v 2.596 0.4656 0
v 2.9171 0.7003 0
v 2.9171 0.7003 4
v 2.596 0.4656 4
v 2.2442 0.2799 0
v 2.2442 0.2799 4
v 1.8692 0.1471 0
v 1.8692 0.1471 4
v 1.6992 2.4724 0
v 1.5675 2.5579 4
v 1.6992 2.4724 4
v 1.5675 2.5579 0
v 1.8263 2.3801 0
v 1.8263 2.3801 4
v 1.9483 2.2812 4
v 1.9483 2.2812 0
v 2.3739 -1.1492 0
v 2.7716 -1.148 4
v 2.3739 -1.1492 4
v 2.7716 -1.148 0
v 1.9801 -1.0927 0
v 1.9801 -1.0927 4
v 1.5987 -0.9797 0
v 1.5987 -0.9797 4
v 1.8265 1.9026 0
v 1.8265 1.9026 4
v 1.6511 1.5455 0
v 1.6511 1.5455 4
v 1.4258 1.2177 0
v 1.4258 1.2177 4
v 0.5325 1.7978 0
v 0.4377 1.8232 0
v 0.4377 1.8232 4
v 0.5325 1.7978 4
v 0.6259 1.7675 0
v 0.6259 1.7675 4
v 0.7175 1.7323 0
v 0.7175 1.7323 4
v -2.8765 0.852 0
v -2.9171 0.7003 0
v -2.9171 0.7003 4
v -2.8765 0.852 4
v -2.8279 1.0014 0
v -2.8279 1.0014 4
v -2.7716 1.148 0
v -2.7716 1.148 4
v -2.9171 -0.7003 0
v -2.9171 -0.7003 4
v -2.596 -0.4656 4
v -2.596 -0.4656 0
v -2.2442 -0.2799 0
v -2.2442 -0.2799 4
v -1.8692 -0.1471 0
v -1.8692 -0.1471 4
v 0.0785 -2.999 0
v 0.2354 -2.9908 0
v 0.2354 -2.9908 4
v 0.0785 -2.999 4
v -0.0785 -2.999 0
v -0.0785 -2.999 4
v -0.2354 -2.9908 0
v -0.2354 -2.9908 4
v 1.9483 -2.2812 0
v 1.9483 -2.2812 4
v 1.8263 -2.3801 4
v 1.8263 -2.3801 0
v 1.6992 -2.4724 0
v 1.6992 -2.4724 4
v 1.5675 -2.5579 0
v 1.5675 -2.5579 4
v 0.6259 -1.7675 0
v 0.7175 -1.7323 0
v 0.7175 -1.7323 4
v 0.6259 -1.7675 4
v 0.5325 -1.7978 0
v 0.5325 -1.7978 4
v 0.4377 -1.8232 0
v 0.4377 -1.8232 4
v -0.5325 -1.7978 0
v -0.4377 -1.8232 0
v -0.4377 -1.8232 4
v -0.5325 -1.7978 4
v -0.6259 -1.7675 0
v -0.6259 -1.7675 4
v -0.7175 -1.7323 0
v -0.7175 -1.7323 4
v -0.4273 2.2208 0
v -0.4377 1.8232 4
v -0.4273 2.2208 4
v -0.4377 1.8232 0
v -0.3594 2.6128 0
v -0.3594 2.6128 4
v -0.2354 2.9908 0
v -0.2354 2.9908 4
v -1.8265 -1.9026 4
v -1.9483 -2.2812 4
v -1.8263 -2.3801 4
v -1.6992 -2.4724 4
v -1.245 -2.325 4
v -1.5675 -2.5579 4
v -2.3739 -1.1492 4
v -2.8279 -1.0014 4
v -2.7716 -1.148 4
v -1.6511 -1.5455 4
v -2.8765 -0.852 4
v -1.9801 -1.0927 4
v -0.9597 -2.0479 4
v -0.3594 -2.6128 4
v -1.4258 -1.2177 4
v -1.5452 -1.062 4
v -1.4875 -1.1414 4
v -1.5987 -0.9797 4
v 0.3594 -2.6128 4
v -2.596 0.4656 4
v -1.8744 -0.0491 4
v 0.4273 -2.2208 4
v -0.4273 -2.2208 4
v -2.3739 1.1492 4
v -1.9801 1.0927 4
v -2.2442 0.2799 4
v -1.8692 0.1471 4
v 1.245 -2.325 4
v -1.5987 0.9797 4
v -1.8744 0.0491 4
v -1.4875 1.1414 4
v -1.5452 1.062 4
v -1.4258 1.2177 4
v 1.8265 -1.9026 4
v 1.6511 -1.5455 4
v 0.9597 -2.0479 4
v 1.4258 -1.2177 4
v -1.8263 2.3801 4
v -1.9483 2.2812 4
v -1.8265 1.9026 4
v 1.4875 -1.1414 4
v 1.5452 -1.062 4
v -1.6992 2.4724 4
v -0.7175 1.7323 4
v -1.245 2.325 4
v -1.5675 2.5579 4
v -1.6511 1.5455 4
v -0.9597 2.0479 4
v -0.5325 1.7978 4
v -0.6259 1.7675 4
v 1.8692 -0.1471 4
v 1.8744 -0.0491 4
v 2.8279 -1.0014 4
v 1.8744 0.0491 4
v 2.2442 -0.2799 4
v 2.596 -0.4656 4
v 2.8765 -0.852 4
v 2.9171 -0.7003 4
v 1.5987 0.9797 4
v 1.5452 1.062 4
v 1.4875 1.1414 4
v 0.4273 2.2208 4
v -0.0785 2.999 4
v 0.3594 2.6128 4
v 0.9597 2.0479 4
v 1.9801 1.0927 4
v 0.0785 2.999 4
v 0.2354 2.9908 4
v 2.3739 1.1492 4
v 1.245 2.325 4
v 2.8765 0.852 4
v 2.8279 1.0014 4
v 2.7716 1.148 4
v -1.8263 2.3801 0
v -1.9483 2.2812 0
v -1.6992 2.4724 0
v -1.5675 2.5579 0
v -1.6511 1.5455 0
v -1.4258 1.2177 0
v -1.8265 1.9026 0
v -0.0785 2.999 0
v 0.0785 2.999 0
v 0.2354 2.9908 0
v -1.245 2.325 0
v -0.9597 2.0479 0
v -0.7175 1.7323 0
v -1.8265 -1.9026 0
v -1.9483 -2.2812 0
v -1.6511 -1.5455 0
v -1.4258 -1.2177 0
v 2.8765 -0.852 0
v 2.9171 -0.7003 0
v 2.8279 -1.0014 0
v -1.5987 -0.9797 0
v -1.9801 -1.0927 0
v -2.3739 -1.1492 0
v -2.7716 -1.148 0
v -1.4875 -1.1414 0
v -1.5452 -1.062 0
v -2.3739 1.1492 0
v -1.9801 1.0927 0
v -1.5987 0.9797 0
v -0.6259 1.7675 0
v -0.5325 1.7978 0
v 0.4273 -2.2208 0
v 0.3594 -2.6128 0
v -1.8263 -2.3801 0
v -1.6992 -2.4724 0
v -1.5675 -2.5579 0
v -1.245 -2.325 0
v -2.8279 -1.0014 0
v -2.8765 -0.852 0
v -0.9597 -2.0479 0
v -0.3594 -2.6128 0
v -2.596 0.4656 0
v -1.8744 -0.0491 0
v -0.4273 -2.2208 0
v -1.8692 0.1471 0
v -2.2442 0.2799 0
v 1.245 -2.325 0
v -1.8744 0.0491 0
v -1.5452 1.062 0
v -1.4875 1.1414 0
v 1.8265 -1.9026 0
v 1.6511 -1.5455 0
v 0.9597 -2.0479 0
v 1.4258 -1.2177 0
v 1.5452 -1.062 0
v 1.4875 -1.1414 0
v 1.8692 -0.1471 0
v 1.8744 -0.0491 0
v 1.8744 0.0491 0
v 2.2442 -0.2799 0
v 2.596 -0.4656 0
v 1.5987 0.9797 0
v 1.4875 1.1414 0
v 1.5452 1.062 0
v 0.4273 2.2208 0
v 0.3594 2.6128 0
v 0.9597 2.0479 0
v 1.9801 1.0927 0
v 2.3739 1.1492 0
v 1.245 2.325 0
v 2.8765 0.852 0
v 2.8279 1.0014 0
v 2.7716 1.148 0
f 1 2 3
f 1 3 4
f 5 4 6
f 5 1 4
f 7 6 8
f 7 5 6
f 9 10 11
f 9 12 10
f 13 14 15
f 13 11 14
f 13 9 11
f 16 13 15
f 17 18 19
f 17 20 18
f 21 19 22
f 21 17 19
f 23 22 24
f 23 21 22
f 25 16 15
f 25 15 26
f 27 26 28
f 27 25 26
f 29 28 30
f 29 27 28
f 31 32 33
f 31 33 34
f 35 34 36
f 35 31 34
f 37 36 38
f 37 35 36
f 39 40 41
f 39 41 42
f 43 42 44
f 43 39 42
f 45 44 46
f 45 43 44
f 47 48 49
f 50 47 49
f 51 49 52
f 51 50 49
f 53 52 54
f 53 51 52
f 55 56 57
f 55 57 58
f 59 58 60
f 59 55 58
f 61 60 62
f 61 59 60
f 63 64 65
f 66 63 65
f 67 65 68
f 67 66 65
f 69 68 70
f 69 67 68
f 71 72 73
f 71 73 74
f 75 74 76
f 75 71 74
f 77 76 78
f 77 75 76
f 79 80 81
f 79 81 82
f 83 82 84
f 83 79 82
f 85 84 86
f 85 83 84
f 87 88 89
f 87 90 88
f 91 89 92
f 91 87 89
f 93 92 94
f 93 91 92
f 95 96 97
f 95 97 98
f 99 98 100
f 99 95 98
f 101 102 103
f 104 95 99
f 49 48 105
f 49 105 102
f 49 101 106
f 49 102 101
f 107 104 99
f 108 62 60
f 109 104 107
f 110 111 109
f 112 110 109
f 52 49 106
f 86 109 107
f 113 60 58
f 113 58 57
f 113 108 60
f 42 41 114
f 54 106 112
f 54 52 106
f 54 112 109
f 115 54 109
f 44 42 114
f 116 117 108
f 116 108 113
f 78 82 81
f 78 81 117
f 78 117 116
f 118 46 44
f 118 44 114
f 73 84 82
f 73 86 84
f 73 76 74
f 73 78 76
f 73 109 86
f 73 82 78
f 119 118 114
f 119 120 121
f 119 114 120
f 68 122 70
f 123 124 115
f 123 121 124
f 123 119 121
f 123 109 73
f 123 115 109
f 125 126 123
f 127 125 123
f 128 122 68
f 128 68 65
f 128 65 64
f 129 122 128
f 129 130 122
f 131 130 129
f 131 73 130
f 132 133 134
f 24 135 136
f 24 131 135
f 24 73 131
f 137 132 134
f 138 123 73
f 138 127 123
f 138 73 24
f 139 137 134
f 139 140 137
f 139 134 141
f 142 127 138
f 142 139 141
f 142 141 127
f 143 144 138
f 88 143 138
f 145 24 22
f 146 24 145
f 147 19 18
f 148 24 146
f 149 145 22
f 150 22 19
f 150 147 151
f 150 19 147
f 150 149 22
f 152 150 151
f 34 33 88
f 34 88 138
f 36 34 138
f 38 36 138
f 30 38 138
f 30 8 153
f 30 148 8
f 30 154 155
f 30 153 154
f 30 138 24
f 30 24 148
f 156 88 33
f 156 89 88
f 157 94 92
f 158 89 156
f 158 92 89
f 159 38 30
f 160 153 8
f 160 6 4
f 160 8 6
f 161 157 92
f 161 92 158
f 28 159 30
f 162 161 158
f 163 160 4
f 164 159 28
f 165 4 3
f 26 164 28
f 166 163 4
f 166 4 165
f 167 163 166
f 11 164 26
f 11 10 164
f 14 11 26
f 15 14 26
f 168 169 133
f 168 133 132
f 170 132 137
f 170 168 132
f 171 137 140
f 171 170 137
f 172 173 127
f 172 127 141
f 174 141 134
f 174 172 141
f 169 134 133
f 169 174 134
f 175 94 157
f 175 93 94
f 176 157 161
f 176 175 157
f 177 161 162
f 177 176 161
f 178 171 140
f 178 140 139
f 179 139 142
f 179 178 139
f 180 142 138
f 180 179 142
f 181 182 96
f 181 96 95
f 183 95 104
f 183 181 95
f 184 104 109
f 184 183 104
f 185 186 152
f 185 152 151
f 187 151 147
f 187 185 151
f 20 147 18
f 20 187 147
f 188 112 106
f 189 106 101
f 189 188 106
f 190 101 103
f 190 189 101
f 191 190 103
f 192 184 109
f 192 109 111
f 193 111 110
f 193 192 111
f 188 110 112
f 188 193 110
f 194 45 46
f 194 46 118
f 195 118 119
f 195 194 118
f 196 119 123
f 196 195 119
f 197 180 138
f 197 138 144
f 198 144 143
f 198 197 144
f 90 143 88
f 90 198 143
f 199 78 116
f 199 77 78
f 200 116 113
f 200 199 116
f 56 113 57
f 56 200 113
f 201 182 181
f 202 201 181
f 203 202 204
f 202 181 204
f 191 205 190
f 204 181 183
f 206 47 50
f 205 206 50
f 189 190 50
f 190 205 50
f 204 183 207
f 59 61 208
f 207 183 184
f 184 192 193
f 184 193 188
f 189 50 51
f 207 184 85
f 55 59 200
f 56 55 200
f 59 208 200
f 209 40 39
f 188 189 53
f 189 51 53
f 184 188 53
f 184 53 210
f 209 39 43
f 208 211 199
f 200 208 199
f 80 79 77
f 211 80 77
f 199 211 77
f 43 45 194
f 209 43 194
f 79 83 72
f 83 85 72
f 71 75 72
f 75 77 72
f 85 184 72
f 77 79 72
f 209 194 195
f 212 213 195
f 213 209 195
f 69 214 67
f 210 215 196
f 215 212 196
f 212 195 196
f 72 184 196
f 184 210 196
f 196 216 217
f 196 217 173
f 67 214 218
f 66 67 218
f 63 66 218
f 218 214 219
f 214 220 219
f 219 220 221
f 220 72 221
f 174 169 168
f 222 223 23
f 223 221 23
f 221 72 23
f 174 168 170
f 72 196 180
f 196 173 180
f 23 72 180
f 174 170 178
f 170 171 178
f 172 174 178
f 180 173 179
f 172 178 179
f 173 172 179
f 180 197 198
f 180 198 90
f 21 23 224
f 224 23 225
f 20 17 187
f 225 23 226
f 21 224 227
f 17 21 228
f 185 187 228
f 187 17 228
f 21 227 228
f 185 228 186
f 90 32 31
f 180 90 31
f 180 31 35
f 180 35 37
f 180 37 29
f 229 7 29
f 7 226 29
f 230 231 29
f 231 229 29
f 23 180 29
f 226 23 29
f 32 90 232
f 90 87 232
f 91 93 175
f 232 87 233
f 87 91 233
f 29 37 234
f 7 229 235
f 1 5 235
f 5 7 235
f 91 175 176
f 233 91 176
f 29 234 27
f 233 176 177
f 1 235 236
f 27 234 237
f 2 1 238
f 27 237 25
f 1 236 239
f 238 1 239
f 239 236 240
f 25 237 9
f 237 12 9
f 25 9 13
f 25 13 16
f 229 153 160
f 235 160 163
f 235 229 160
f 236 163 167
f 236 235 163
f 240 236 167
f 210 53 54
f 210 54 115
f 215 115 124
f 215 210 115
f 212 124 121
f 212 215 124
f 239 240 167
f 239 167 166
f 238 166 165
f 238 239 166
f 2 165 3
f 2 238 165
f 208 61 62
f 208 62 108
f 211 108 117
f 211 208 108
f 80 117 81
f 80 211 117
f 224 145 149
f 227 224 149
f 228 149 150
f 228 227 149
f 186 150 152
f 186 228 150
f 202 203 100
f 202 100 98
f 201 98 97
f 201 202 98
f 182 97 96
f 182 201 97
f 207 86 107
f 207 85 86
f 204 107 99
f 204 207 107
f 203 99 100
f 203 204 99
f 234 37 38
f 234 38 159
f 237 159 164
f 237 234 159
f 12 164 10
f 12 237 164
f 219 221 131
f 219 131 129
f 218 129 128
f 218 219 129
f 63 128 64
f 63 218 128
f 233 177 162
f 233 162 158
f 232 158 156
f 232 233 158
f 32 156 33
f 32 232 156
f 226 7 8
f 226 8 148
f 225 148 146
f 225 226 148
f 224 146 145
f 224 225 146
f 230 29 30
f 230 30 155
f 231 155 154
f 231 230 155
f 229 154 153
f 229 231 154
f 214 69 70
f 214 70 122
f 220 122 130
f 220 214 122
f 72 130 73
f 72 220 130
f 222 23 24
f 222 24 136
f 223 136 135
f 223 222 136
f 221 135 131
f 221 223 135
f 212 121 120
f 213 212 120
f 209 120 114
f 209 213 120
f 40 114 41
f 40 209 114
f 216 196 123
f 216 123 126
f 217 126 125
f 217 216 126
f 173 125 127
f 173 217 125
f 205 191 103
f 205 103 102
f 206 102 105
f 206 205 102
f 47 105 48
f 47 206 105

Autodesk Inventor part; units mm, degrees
sketch "Sketch1" plane through (0, 0, 0) normal (0, 0, 1) x (1, 0, 0)
  circle A0 centre (0, 0) radius 3
  dimension "d0" = 6
extrude "Extrusion1" add sketch "Sketch1" along normal blind 4
ref_plane "Work Plane2" through (0, 0, 2) normal (0, 0, 1) x (1, 0, 0)
sketch "Sketch2" plane through (0, 0, 0) normal (0, 0, -1) x (-1, 0, 0)
  circle A0 centre (0, 0) radius 3 projected
  circle A1 centre (0, 0) radius 2.5
  dimension "d3" = 5
surface extrude "Flankendurchmesser" sketch "Sketch2" against normal through all shown no curves A1
ref_plane "Work Plane8" through (0, 0, 0) normal (0.9510565, 0.309017, 0) x (0, 0, 1)
ref_plane "Work Plane9" through (0, 0, 0) normal (1, 0, 0) x (0, 1, 0)
spur gear teeth "Stirnzahnrad" teeth 10 pitch diameter 5 tip diameter 6 root diameter 3.75 face width 4 start plane through (0, 0, 0) normal (0, 0, -1) x (-1, 0, 0)
equation "\"d0\" = da_da"
equation "\"d1\" = da_b"
equation "\"d3\" = da_dw"
equation "\"d16\" = da_aw"
equation "\"d43\" = da_aw"
equation "\"d46\" = da_aw"
equation "\"da_da\" = 6"
equation "\"da_b\" = 4"
equation "\"da_dw\" = 5"
equation "\"da_aw\" = 15"
properties part number "Stirnzahnrad1" material "Steel"
